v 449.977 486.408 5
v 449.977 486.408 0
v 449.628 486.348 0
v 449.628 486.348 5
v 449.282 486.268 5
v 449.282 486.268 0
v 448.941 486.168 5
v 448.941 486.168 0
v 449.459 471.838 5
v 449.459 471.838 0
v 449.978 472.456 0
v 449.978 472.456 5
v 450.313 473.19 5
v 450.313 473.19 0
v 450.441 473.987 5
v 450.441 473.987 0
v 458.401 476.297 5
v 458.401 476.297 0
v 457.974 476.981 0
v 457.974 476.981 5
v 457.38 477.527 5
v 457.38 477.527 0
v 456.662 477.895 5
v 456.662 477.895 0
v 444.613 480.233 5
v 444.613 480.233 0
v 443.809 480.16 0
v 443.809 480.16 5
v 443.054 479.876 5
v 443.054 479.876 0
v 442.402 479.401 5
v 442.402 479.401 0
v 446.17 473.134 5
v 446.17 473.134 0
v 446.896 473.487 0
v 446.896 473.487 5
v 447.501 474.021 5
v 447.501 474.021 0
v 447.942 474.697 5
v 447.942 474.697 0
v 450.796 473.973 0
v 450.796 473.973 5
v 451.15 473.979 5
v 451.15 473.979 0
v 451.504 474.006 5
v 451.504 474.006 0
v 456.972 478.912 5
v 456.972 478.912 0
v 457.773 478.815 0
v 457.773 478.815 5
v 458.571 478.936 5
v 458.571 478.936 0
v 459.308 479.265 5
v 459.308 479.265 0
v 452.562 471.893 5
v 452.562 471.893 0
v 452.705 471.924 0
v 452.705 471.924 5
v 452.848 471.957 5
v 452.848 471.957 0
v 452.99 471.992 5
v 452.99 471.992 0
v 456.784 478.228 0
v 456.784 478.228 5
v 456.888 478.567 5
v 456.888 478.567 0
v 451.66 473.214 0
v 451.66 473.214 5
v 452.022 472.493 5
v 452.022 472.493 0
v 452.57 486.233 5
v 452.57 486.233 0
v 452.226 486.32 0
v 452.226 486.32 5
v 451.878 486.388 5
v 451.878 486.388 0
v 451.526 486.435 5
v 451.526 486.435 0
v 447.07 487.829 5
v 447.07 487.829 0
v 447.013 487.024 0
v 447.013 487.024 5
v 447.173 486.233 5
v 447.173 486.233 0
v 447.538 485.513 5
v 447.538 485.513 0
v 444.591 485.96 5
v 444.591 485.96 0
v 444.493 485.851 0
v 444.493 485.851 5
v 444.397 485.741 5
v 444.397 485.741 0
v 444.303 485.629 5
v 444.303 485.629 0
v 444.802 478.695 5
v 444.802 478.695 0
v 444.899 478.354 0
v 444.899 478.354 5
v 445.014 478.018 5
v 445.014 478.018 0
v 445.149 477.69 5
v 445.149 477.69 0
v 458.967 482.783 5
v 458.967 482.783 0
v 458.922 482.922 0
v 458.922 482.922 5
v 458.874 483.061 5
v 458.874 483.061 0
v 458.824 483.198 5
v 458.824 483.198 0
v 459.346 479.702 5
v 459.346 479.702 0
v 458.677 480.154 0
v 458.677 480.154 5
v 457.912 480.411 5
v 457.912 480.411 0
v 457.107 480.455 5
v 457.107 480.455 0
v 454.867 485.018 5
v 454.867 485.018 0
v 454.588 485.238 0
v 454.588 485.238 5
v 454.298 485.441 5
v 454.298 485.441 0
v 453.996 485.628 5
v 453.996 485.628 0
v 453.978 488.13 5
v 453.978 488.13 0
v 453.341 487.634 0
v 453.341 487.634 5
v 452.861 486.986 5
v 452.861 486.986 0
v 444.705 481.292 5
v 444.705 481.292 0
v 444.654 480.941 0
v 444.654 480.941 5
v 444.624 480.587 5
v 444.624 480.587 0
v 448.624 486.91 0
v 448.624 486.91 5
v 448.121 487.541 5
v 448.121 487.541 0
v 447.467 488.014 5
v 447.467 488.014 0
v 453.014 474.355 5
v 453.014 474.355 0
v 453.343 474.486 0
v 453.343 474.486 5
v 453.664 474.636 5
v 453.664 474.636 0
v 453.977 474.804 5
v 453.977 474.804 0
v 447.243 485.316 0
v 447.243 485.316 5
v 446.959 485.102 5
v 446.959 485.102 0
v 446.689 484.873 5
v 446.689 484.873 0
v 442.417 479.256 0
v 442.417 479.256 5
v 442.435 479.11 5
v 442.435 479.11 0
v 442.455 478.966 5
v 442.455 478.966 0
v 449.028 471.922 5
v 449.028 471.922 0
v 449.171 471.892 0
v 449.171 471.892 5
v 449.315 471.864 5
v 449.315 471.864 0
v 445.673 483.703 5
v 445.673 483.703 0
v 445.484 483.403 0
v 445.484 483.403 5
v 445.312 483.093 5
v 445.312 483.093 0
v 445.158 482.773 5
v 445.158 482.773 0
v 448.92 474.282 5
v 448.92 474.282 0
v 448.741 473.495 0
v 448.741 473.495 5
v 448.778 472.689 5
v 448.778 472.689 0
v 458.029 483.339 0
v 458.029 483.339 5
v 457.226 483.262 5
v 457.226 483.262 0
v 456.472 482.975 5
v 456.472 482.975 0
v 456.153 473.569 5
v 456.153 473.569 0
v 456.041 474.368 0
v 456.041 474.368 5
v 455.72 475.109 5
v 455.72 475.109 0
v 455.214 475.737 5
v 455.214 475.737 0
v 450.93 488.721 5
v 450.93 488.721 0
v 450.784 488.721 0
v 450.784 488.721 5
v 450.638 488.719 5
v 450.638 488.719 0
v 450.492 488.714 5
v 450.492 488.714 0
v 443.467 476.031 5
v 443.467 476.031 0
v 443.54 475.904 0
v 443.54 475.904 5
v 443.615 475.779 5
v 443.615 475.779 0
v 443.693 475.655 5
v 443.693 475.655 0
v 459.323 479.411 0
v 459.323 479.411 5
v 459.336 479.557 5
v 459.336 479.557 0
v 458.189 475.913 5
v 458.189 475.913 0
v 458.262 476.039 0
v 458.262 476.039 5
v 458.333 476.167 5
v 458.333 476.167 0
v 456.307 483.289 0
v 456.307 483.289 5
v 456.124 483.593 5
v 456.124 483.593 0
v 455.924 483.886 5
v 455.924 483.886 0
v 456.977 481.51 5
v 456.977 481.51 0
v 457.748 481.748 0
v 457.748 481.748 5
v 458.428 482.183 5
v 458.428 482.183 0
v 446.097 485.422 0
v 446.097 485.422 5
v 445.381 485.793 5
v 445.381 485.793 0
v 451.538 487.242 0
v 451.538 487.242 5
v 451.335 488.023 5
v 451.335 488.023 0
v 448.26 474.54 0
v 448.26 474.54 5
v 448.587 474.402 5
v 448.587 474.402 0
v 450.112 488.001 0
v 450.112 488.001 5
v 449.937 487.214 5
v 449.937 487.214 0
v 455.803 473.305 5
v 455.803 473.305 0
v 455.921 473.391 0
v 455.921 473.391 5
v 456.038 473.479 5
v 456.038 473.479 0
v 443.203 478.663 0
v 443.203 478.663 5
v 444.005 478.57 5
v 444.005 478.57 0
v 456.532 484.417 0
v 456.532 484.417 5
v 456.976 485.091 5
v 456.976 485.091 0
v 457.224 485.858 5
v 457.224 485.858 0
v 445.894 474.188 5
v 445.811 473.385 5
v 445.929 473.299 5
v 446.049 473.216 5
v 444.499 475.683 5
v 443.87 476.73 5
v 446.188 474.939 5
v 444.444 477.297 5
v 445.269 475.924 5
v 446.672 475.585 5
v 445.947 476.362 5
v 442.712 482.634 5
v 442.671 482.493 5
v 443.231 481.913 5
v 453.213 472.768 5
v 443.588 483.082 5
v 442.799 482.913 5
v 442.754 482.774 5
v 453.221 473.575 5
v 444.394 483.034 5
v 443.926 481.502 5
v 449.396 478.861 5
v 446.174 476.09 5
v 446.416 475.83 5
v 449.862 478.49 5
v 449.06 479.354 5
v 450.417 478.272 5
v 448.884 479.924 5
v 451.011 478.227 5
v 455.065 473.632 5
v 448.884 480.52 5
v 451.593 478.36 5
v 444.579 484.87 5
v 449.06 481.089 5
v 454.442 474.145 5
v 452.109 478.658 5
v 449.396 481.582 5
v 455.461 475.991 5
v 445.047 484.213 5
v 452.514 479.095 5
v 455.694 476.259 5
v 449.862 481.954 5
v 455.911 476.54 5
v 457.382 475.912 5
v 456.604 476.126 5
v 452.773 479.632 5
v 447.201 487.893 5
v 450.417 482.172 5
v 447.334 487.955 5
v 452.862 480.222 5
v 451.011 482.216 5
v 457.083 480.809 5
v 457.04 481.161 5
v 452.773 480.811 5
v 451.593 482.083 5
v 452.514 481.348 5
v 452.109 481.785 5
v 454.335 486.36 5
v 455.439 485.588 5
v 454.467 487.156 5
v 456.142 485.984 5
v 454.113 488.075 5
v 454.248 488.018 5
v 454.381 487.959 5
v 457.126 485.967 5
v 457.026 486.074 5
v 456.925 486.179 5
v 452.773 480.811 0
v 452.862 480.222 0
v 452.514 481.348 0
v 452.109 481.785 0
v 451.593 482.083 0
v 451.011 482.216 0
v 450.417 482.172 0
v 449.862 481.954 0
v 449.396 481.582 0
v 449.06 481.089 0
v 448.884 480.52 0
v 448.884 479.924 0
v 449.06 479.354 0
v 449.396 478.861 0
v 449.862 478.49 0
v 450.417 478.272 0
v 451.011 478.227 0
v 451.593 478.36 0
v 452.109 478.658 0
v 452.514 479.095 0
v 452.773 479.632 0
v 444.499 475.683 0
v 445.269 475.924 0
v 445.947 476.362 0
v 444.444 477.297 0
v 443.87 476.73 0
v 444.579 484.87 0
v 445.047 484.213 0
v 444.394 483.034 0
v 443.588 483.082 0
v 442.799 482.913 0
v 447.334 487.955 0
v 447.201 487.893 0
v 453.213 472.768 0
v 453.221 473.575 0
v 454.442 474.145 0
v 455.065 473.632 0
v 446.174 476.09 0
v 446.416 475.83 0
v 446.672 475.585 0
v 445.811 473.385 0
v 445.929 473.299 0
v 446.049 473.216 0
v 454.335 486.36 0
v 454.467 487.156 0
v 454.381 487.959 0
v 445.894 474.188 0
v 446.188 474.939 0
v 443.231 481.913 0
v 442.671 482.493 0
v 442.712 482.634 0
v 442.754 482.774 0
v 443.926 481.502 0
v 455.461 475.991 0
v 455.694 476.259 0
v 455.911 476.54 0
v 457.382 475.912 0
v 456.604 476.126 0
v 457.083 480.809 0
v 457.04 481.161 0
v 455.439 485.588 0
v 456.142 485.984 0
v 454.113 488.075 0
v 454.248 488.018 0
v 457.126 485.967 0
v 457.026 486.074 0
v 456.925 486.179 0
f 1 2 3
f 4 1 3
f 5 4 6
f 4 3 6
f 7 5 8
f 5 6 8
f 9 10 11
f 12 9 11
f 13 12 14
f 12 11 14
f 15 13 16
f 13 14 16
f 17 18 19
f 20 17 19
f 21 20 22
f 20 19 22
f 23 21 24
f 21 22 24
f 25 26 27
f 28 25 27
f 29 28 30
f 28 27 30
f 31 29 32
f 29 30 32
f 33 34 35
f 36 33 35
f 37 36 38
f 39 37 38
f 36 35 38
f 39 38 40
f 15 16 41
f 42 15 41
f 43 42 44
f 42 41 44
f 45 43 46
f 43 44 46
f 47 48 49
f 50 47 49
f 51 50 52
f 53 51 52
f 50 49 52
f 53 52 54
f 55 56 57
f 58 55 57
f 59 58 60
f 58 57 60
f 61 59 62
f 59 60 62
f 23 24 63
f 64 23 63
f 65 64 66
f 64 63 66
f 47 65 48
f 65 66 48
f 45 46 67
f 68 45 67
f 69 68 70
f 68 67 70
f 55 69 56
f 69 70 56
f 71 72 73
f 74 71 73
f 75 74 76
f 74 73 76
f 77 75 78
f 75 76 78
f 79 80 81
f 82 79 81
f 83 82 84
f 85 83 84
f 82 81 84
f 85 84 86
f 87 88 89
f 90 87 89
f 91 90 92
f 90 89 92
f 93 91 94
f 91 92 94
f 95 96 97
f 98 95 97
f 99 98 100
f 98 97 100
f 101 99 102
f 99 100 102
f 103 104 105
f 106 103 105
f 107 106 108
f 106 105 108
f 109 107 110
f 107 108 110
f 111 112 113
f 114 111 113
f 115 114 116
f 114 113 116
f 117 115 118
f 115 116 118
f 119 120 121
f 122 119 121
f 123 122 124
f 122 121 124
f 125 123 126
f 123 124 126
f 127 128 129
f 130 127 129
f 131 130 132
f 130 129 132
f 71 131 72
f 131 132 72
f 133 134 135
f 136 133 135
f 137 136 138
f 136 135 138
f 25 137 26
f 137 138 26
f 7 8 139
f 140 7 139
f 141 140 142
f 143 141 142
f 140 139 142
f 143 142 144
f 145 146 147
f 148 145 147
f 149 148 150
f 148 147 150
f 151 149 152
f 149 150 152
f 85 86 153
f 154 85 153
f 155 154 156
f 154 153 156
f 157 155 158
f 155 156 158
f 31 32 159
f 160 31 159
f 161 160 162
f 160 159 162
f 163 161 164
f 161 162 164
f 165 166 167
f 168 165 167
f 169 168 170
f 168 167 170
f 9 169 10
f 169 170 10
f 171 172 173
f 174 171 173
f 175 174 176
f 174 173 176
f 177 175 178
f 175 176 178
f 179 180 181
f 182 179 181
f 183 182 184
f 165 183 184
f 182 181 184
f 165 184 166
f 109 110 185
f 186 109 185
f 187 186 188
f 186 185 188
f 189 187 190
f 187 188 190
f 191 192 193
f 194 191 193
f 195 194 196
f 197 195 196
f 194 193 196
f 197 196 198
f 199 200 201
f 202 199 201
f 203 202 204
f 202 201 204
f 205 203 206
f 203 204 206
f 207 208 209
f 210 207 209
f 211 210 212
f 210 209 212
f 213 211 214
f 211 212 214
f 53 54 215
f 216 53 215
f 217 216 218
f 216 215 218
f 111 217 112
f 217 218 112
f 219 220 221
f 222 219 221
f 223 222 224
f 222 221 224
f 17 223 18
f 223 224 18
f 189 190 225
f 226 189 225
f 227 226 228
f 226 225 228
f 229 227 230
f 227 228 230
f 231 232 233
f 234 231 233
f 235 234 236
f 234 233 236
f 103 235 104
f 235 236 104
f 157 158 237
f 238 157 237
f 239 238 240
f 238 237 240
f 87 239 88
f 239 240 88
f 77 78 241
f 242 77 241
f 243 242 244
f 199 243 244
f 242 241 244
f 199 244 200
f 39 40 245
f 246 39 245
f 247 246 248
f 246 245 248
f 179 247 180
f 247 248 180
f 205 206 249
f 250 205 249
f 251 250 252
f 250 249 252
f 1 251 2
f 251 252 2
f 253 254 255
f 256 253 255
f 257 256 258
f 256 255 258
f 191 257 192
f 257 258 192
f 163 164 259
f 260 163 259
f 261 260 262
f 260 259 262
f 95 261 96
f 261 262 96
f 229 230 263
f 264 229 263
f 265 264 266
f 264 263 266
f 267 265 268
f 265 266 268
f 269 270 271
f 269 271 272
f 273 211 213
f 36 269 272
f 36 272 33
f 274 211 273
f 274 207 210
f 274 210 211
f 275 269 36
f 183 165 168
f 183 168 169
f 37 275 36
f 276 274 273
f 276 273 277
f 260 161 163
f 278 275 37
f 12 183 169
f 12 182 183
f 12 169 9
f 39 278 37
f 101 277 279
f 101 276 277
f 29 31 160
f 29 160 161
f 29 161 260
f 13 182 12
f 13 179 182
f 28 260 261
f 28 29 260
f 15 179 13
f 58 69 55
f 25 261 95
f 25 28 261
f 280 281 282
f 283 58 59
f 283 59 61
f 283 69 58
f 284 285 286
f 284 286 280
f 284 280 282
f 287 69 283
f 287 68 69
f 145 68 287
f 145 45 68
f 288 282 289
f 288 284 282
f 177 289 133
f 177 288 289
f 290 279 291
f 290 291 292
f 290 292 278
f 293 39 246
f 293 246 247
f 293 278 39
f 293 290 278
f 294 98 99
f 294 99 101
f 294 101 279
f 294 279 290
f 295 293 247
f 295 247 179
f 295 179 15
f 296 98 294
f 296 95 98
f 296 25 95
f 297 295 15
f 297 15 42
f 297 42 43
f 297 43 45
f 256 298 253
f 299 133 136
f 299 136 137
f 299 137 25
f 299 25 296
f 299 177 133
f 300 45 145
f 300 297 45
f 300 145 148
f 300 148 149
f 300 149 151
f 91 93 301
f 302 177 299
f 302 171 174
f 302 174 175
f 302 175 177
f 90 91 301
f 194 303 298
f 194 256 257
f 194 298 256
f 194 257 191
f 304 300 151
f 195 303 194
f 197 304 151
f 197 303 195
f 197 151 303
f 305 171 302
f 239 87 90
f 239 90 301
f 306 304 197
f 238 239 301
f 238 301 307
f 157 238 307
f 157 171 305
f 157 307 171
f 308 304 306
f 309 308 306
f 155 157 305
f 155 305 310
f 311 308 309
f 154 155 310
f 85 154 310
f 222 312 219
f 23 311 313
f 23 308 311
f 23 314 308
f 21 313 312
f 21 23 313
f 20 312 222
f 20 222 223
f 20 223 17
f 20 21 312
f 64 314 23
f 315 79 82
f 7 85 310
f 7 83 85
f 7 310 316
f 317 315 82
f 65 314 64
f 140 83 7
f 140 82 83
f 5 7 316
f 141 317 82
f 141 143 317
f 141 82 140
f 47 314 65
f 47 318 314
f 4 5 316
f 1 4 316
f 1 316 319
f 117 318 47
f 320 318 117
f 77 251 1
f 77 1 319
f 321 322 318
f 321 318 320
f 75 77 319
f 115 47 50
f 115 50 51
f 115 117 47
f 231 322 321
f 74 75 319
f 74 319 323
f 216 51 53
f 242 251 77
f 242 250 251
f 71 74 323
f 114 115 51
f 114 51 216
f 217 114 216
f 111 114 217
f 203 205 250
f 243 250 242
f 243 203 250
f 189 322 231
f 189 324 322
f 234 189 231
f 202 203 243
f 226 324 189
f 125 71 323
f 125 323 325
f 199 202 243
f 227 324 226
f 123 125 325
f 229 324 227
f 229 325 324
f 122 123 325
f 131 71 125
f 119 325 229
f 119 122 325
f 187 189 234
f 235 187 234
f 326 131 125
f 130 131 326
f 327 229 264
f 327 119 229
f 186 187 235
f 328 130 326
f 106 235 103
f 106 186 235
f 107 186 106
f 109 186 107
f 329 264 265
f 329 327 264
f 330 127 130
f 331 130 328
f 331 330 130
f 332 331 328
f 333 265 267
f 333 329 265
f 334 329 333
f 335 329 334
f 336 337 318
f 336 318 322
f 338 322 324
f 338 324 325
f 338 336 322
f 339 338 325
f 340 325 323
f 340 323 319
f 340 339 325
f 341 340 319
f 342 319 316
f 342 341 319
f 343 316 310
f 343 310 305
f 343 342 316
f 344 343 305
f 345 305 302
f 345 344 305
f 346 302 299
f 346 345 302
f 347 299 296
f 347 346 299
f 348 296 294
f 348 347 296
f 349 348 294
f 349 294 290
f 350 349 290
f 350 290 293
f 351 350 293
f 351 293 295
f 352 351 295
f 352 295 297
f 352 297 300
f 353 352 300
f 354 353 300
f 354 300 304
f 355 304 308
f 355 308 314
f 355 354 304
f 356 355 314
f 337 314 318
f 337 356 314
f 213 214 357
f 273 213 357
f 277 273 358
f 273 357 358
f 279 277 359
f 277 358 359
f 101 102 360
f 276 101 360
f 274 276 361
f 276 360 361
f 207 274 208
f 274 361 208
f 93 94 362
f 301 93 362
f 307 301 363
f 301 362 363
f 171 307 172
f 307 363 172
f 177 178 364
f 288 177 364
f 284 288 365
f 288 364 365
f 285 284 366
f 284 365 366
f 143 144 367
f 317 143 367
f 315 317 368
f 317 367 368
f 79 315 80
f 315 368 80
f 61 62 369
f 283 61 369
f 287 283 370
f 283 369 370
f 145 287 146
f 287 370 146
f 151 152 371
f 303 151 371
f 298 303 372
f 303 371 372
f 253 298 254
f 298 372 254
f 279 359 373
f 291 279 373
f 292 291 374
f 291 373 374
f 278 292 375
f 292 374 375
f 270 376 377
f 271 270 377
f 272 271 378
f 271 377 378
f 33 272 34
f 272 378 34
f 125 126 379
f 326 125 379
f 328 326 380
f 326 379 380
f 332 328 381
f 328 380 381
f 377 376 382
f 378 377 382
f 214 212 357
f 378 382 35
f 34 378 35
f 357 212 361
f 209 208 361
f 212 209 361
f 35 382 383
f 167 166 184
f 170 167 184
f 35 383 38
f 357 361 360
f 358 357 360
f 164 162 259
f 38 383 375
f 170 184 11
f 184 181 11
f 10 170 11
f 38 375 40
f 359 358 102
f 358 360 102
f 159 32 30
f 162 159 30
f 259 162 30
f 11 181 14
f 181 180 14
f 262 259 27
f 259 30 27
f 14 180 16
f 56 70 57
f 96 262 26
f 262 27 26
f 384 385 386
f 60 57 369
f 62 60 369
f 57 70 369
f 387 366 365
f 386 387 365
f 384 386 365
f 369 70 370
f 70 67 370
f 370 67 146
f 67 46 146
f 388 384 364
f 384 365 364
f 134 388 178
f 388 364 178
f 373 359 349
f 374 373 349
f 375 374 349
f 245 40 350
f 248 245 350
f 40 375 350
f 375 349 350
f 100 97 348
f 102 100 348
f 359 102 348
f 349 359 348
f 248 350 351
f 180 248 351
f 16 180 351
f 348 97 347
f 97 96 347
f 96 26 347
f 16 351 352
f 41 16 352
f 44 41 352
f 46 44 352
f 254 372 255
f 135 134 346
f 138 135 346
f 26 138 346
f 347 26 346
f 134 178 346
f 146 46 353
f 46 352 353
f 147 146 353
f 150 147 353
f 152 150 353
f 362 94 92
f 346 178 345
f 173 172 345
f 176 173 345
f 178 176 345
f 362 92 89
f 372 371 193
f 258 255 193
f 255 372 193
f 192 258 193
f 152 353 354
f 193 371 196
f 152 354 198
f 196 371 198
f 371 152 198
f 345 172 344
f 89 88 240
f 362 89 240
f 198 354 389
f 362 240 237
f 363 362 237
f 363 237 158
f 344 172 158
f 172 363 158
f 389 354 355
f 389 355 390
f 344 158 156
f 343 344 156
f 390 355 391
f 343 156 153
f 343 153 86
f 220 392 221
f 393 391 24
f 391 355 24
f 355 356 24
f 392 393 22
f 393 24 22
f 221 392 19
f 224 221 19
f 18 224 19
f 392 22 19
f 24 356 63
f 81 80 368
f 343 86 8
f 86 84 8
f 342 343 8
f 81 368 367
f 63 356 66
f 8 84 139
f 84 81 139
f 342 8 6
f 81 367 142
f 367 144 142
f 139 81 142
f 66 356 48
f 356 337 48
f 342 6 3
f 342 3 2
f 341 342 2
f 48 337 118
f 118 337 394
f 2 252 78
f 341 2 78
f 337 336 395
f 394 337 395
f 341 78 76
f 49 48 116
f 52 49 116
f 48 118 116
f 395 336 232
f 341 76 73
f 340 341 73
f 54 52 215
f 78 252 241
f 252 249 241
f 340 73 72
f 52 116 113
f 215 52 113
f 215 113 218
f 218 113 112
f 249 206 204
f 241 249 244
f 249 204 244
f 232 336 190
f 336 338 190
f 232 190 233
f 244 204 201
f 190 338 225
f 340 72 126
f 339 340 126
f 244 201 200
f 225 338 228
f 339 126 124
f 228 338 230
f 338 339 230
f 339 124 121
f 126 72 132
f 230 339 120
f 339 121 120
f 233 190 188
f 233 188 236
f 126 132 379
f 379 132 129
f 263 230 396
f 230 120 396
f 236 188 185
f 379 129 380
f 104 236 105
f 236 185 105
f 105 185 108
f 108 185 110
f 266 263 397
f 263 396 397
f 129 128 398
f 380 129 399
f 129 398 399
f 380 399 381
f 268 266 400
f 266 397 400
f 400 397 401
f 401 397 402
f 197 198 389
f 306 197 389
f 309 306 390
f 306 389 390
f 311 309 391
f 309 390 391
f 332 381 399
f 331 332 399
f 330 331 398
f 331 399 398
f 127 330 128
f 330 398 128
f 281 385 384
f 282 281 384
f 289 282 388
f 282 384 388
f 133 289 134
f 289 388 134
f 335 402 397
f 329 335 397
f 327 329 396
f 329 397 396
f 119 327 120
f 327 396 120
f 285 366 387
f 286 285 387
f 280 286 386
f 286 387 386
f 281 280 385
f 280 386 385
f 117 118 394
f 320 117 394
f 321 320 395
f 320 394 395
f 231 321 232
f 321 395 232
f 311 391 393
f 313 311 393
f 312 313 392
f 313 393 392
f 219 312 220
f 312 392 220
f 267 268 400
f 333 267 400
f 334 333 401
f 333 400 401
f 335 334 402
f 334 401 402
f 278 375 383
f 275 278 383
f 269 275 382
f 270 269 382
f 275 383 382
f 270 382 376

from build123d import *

# Parameters (mm, degrees)
MODEL_R             = 2
BOSS_EXTRUDE1_DEPTH = 5


with BuildPart() as part:
    # Model → Boss-Extrude1 (new body)
    with BuildSketch(Plane.XY):
        with BuildLine():
            ThreePointArc((455.213810884, 475.737053866), (455.579522306, 476.123501007), (455.911034715, 476.539656939))
            ThreePointArc((455.911034715, 476.539656939), (456.985627664, 475.992517671), (458.188848778, 475.912703304))
            ThreePointArc((458.188848778, 475.912703304), (458.297616539, 476.103235845), (458.401430664, 476.296512079))
            ThreePointArc((458.401430664, 476.296512079), (457.695483937, 477.274137059), (456.66162305, 477.894816565))
            ThreePointArc((456.66162305, 477.894816565), (456.838534846, 478.396601831), (456.972120634, 478.911617437))
            ThreePointArc((456.972120634, 478.911617437), (458.176351731, 478.848857172), (459.308012342, 479.265337237))
            ThreePointArc((459.308012342, 479.265337237), (459.329880069, 479.483637208), (459.346106466, 479.702428842))
            ThreePointArc((459.346106466, 479.702428842), (458.303556137, 480.3083993), (457.106624121, 480.454909137))
            ThreePointArc((457.106624121, 480.454909137), (457.064146634, 480.985269298), (456.976707605, 481.5100937))
            ThreePointArc((456.976707605, 481.5100937), (458.102354353, 481.942564259), (458.96678006, 482.783325568))
            ThreePointArc((458.96678006, 482.783325568), (458.897966625, 482.991646922), (458.823799602, 483.198122895))
            ThreePointArc((458.823799602, 483.198122895), (457.624912095, 483.327661034), (456.471869369, 482.974668319))
            ThreePointArc((456.471869369, 482.974668319), (456.217347342, 483.441899284), (455.9240025, 483.885785577))
            ThreePointArc((455.9240025, 483.885785577), (456.776430349, 484.73870887), (457.224154095, 485.858376156))
            ThreePointArc((457.224154095, 485.858376156), (457.076557966, 486.020698236), (456.924821674, 486.179156978))
            ThreePointArc((456.924821674, 486.179156978), (455.776895531, 485.809864476), (454.867113658, 485.018404858))
            ThreePointArc((454.867113658, 485.018404858), (454.444556262, 485.341718149), (453.996027593, 485.627914358))
            ThreePointArc((453.996027593, 485.627914358), (454.427844026, 486.753812201), (454.381450307, 487.958784817))
            ThreePointArc((454.381450307, 487.958784817), (454.180592196, 488.047040662), (453.977523219, 488.130083216))
            ThreePointArc((453.977523219, 488.130083216), (453.079045297, 487.325814102), (452.569833828, 486.232738138))
            ThreePointArc((452.569833828, 486.232738138), (452.052305076, 486.35622995), (451.526147262, 486.435250151))
            ThreePointArc((451.526147262, 486.435250151), (451.462687294, 487.639444578), (450.930198006, 488.721371813))
            ThreePointArc((450.930198006, 488.721371813), (450.710808105, 488.720301185), (450.491518914, 488.713568739))
            ThreePointArc((450.491518914, 488.713568739), (449.997844209, 487.613388449), (449.977250433, 486.407698904))
            ThreePointArc((449.977250433, 486.407698904), (449.454235747, 486.31001638), (448.941426255, 486.168197264))
            ThreePointArc((448.941426255, 486.168197264), (448.393662691, 487.242472118), (447.467150069, 488.014278923))
            ThreePointArc((447.467150069, 488.014278923), (447.267162884, 487.924066944), (447.069570573, 487.828723599))
            ThreePointArc((447.069570573, 487.828723599), (447.066059926, 486.622863301), (447.537644694, 485.51303485))
            ThreePointArc((447.537644694, 485.51303485), (447.099578065, 485.211068187), (446.688786314, 484.872931566))
            ThreePointArc((446.688786314, 484.872931566), (445.751432451, 485.631534965), (444.591098944, 485.959768933))
            ThreePointArc((444.591098944, 485.959768933), (444.445094078, 485.796014074), (444.303364151, 485.62854556))
            ThreePointArc((444.303364151, 485.62854556), (444.790624586, 484.525509454), (445.672846607, 483.703441519))
            ThreePointArc((445.672846607, 483.703441519), (445.395473735, 483.249403495), (445.157729351, 482.773416263))
            ThreePointArc((445.157729351, 482.773416263), (443.992862186, 483.085178789), (442.79934, 482.913085284))
            ThreePointArc((442.79934, 482.913085284), (442.732563019, 482.704102247), (442.67120187, 482.493465393))
            ThreePointArc((442.67120187, 482.493465393), (443.56498163, 481.683978441), (444.705296702, 481.291814037))
            ThreePointArc((444.705296702, 481.291814037), (444.636577876, 480.764211952), (444.612989023, 480.232676626))
            ThreePointArc((444.612989023, 480.232676626), (443.422024673, 480.043691705), (442.401684635, 479.401027258))
            ThreePointArc((442.401684635, 479.401027258), (442.425681887, 479.182951108), (442.455299415, 478.965566939))
            ThreePointArc((442.455299415, 478.965566939), (443.60105586, 478.589596791), (444.802293147, 478.695144705))
            ThreePointArc((444.802293147, 478.695144705), (444.954110477, 478.185205752), (445.148755882, 477.690029618))
            ThreePointArc((445.148755882, 477.690029618), (444.137622902, 477.03297446), (443.466891075, 476.030861592))
            ThreePointArc((443.466891075, 476.030861592), (443.577513216, 475.841399678), (443.692988281, 475.654855892))
            ThreePointArc((443.692988281, 475.654855892), (444.892609713, 475.777411201), (445.947064377, 476.36242124))
            ThreePointArc((445.947064377, 476.36242124), (446.293167267, 475.958318498), (446.67239097, 475.585122008))
            ThreePointArc((446.67239097, 475.585122008), (446.015923439, 474.573607419), (445.810775449, 473.385320549))
            ThreePointArc((445.810775449, 473.385320549), (445.988894907, 473.257232556), (446.170260821, 473.133784268))
            ThreePointArc((446.170260821, 473.133784268), (447.216321796, 473.733674108), (447.941669045, 474.696992722))
            ThreePointArc((447.941669045, 474.696992722), (448.422213161, 474.468599225), (448.92044394, 474.281911443))
            ThreePointArc((448.92044394, 474.281911443), (448.732151056, 473.090837485), (449.028058855, 471.921842207))
            ThreePointArc((449.028058855, 471.921842207), (449.242877156, 471.877275714), (449.458774107, 471.838268254))
            ThreePointArc((449.458774107, 471.838268254), (450.170401179, 472.811766221), (450.441221884, 473.986826871))
            ThreePointArc((450.441221884, 473.986826871), (450.973116782, 473.973633929), (451.504206009, 474.005734869))
            ThreePointArc((451.504206009, 474.005734869), (451.816645324, 472.84104905), (452.562443764, 471.893475269))
            ThreePointArc((452.562443764, 471.893475269), (452.776816874, 471.940136226), (452.989914315, 471.992314338))
            ThreePointArc((452.989914315, 471.992314338), (453.244060699, 473.171093791), (453.0135275, 474.354717814))
            ThreePointArc((453.0135275, 474.354717814), (453.504803721, 474.559006608), (453.976921244, 474.804345725))
            ThreePointArc((453.976921244, 474.804345725), (454.736069161, 473.867432804), (455.802802917, 473.305124634))
            ThreePointArc((455.802802917, 473.305124634), (455.979663777, 473.434944938), (456.153115226, 473.569286554))
            ThreePointArc((456.153115226, 473.569286554), (455.905836703, 474.749525816), (455.213810884, 475.737053866))
        make_face()
        with Locations((450.861979287, 480.22164557)):
            Circle(MODEL_R, mode=Mode.SUBTRACT)
    extrude(amount=BOSS_EXTRUDE1_DEPTH)


solid = part.part
